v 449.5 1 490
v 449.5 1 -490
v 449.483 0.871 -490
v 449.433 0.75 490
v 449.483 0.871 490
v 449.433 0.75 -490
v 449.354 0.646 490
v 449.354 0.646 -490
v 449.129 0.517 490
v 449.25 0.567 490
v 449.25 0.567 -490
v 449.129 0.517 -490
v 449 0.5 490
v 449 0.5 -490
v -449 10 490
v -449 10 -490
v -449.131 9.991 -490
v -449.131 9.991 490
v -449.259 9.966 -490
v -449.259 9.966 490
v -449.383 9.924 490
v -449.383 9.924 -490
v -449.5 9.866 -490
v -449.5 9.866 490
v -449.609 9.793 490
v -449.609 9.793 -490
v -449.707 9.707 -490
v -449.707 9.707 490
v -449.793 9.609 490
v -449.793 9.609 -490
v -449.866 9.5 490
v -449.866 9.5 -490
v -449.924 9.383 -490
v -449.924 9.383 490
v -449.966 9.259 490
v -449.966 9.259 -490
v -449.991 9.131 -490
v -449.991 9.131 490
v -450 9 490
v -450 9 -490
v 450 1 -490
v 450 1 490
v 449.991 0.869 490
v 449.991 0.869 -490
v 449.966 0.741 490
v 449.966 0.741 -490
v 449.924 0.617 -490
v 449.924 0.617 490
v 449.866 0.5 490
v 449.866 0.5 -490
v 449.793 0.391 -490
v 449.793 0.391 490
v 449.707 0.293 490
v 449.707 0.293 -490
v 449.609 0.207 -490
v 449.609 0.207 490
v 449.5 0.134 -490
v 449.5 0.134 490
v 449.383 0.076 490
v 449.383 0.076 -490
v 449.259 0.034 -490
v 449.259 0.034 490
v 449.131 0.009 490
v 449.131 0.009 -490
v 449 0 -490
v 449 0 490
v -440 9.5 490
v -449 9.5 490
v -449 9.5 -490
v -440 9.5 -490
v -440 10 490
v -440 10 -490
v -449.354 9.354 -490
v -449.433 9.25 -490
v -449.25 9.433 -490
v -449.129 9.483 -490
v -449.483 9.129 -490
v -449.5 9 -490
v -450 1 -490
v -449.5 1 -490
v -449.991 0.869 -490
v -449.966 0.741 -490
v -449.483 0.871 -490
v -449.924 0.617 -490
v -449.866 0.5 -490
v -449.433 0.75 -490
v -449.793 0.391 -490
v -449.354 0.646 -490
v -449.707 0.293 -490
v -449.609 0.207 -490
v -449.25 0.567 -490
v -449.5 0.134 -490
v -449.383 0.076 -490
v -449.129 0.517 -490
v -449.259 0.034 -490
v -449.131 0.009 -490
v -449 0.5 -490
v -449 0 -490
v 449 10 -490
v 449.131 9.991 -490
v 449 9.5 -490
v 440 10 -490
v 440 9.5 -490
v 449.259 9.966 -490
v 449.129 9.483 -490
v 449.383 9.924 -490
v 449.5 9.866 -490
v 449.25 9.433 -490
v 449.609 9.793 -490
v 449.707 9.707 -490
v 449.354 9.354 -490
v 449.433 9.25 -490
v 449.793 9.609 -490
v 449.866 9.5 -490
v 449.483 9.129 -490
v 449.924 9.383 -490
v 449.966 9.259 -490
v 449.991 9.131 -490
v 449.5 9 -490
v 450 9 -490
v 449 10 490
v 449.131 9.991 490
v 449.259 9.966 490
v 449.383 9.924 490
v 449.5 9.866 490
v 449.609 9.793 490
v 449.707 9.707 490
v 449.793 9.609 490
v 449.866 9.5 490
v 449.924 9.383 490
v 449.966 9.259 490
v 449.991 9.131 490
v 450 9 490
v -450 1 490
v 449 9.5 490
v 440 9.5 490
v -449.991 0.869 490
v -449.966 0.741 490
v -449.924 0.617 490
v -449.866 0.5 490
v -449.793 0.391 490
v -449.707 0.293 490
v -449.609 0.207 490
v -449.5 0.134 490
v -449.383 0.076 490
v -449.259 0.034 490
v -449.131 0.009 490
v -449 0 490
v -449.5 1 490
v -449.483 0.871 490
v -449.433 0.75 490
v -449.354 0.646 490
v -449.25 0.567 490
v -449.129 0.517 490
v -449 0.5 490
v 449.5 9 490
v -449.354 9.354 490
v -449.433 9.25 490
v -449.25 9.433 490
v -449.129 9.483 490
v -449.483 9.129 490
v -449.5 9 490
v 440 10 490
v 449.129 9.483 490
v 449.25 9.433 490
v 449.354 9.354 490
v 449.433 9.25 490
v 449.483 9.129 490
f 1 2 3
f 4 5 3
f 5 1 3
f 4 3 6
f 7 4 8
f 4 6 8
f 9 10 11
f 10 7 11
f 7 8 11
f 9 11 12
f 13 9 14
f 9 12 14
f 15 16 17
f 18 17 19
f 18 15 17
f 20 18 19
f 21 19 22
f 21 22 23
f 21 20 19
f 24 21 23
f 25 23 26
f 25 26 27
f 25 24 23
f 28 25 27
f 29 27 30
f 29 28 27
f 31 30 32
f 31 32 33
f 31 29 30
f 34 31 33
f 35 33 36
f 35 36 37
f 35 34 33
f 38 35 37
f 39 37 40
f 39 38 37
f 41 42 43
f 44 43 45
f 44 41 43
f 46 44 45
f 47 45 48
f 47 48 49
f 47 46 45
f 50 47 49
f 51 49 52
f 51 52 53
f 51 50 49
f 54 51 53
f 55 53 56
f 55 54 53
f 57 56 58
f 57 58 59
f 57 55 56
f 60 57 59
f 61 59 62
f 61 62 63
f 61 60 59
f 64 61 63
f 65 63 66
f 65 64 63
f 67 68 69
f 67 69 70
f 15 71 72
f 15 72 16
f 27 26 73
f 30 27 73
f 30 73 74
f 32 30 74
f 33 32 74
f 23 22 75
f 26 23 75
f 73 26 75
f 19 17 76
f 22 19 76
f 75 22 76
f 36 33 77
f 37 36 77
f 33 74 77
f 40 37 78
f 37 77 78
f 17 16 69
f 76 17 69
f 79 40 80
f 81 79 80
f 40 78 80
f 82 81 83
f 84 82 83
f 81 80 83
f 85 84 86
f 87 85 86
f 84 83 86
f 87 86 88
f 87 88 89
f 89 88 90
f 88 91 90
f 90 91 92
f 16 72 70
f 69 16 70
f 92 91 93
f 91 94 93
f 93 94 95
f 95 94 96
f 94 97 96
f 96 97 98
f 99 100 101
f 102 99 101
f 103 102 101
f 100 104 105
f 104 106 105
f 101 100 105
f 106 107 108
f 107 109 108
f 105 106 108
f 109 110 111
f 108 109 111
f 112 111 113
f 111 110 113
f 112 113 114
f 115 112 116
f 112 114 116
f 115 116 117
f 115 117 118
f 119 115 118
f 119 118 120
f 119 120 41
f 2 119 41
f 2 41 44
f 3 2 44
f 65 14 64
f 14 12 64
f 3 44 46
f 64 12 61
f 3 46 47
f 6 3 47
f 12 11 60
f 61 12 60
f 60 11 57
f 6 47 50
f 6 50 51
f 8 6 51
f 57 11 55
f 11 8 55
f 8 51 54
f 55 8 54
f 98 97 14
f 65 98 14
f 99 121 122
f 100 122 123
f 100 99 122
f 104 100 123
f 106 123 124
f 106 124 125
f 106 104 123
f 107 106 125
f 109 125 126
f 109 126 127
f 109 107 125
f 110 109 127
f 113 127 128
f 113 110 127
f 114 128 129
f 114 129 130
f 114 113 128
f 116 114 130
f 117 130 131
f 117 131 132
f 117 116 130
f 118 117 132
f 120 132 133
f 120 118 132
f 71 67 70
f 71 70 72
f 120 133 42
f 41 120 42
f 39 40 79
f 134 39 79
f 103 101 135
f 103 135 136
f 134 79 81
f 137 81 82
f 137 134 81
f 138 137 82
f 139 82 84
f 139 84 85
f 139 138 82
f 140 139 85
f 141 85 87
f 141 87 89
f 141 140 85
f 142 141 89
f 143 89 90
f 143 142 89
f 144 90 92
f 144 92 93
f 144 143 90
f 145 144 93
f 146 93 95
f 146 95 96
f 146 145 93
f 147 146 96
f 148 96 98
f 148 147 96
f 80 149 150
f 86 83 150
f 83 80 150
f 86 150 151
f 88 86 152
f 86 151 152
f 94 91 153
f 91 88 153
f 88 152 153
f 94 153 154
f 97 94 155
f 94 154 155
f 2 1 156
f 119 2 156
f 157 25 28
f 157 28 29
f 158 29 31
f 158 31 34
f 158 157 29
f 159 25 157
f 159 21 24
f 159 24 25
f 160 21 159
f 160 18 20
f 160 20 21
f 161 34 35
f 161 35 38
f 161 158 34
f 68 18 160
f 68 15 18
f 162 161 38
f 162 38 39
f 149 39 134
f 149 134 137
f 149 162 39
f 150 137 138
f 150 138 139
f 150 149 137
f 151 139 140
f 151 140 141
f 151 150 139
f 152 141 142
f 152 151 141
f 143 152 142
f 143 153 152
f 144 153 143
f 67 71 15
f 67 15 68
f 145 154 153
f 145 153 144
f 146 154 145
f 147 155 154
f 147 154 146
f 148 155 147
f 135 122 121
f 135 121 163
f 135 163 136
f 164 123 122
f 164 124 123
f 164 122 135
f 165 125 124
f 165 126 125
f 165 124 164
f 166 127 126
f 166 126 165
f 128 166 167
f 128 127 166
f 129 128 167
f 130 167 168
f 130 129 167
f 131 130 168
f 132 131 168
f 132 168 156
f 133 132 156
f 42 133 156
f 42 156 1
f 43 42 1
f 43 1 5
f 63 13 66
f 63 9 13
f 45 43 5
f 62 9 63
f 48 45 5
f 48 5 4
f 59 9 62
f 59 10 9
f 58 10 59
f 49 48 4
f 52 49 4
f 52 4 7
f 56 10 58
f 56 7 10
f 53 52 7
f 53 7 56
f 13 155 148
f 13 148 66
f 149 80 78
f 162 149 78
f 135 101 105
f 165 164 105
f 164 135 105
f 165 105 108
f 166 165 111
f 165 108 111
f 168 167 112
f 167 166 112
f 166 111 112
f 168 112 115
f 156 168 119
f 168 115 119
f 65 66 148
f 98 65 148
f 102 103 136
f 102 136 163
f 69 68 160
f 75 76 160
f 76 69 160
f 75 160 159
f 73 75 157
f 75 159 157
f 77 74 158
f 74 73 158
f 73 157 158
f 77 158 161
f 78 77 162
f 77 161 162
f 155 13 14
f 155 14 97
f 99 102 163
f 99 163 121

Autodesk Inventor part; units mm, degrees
ref_plane "YZ Plane" through (0, 0, 0) normal (1, 0, 0) x (0, 1, 0)
ref_plane "XZ Plane" through (0, 0, 0) normal (0, 1, 0) x (-1, 0, 0)
ref_plane "XY Plane" through (0, 0, 0) normal (0, 0, 1) x (1, 0, 0)
sketch "Sketch6" plane through (0, 0, 0) normal (0, 1, 0) x (-1, 0, 0)
  line L0 (450, -490) -> (-450, -490)
  line L1 (-450, -490) -> (-450, 490)
  line L2 (-450, 490) -> (450, 490)
  line L3 (450, 490) -> (450, -490)
  line L4 (450, -490) -> (-450, 490) construction
  line L5 (-450, -490) -> (450, 490) construction
  point P0 (0, 0)
  dimension "d52" = 900
  dimension "d53" = 980
extrude "Plate2" add sketch "Sketch6" along normal blind 0.5
sketch "Sketch11" plane through (449.5, 0, -490) normal (1, 0, 0) x (0, 1, 0)
  line L0 (0, 980) -> (0, 0)
  line L1 (0, 0) -> (10, 0)
  line L2 (10, 0) -> (10, 980)
  line L3 (10, 980) -> (0, 980)
edge flange "Flange2" height 10 angle 90 thickness 0.5 bend radius 0.5 thickness toward (1, 0, 0) relief tear relief width 0.5 relief depth 0.25 edges at (450, 0.5, 0) wall of the first edge with corners at (449.5, 0, 490) (449.5, 0, -490) (449.5, 10, -490) (449.5, 10, 490)
bend "Bend3"
corner "Corner3"
sketch "Sketch12" plane through (450, 9.5, -490) normal (0, 1, 0) x (-1, 0, 0)
  line L0 (0, 980) -> (0, 0)
  line L1 (0, 0) -> (10, 0)
  line L2 (10, 0) -> (10, 980)
  line L3 (10, 980) -> (0, 980)
edge flange "Flange3" height 10 angle 90 thickness 0.5 bend radius 0.5 thickness toward (0, 1, 0) relief tear relief width 0.5 relief depth 0.25 edges at (449.5, 10, 0) wall of the first edge with corners at (450, 9.5, 490) (450, 9.5, -490) (440, 9.5, -490) (440, 9.5, 490)
bend "Bend4"
corner "Corner4"
sketch "Sketch13" plane through (-449.5, 0, 490) normal (-1, 0, 0) x (0, -1, 0)
  line L0 (0, -980) -> (0, 0)
  line L1 (0, 0) -> (-10, 0)
  line L2 (-10, 0) -> (-10, -980)
  line L3 (-10, -980) -> (0, -980)
edge flange "Flange4" height 10 angle 90 thickness 0.5 bend radius 0.5 thickness toward (-1, 0, 0) relief tear relief width 0.5 relief depth 0.25 edges at (-450, 0.5, 0) wall of the first edge with corners at (-449.5, 0, -490) (-449.5, 0, 490) (-449.5, 10, 490) (-449.5, 10, -490)
bend "Bend5"
corner "Corner5"
sketch "Sketch14" plane through (-450, 9.5, 490) normal (0, 1, 0) x (-1, 0, 0)
  line L0 (0, -980) -> (0, 0)
  line L1 (0, 0) -> (-10, 0)
  line L2 (-10, 0) -> (-10, -980)
  line L3 (-10, -980) -> (0, -980)
edge flange "Flange5" height 10 angle 90 thickness 0.5 bend radius 0.5 thickness toward (0, 1, 0) relief tear relief width 0.5 relief depth 0.25 edges at (-449.5, 10, 0) wall of the first edge with corners at (-450, 9.5, -490) (-450, 9.5, 490) (-440, 9.5, 490) (-440, 9.5, -490)
bend "Bend6"
corner "Corner6"
equation "\"d52\" = ЖАБРЫ_базовая_ширина - ЖАБРЫ_коррекция"
equation "\"d53\" = ЖАБРЫ_базовая_длина_кор_лист"
equation "\"d54\" = Thickness"
equation "\"d84\" = BendReliefWidth"
equation "\"d85\" = BendReliefDepth"
equation "\"d86\" = MinimumRemnant"
equation "\"d87\" = TransitionRadius"
equation "\"d90\" = BendRadius"
equation "\"d91\" = CornerReliefSize"
equation "\"d92\" = GapSize"
equation "\"d93\" = JacobiRadiusSize"
equation "\"d94\" = BendReliefWidth"
equation "\"d95\" = BendReliefDepth"
equation "\"d96\" = MinimumRemnant"
equation "\"d97\" = TransitionRadius"
equation "\"d100\" = BendRadius"
equation "\"d101\" = CornerReliefSize"
equation "\"d102\" = GapSize"
equation "\"d103\" = JacobiRadiusSize"
equation "\"d104\" = BendReliefWidth"
equation "\"d105\" = BendReliefDepth"
equation "\"d106\" = MinimumRemnant"
equation "\"d107\" = TransitionRadius"
equation "\"d110\" = BendRadius"
equation "\"d111\" = CornerReliefSize"
equation "\"d112\" = GapSize"
equation "\"d113\" = JacobiRadiusSize"
equation "\"d114\" = BendReliefWidth"
equation "\"d115\" = BendReliefDepth"
equation "\"d116\" = MinimumRemnant"
equation "\"d117\" = TransitionRadius"
equation "\"d120\" = BendRadius"
equation "\"d121\" = CornerReliefSize"
equation "\"d122\" = GapSize"
equation "\"d123\" = JacobiRadiusSize"
equation "\"BendRadius\" = Thickness"
equation "\"BendReliefWidth\" = Thickness"
equation "\"BendReliefDepth\" = 0.5 * Thickness"
equation "\"CornerReliefSize\" = 4 * Thickness"
equation "\"MinimumRemnant\" = 2 * Thickness"
equation "\"TransitionRadius\" = BendRadius"
equation "\"JacobiRadiusSize\" = BendRadius"
equation "\"GapSize\" = Thickness"
equation "\"ЖАБРЫ_базовая_ширина\" = 925"
equation "\"ЖАБРЫ_коррекция\" = 25"
equation "\"ЖАБРЫ_базовая_длина_кор_лист\" = 980"
equation "\"Thickness\" = 0.5"
properties part number "MSC 803 sheet gills" material "Stainless Steel"
